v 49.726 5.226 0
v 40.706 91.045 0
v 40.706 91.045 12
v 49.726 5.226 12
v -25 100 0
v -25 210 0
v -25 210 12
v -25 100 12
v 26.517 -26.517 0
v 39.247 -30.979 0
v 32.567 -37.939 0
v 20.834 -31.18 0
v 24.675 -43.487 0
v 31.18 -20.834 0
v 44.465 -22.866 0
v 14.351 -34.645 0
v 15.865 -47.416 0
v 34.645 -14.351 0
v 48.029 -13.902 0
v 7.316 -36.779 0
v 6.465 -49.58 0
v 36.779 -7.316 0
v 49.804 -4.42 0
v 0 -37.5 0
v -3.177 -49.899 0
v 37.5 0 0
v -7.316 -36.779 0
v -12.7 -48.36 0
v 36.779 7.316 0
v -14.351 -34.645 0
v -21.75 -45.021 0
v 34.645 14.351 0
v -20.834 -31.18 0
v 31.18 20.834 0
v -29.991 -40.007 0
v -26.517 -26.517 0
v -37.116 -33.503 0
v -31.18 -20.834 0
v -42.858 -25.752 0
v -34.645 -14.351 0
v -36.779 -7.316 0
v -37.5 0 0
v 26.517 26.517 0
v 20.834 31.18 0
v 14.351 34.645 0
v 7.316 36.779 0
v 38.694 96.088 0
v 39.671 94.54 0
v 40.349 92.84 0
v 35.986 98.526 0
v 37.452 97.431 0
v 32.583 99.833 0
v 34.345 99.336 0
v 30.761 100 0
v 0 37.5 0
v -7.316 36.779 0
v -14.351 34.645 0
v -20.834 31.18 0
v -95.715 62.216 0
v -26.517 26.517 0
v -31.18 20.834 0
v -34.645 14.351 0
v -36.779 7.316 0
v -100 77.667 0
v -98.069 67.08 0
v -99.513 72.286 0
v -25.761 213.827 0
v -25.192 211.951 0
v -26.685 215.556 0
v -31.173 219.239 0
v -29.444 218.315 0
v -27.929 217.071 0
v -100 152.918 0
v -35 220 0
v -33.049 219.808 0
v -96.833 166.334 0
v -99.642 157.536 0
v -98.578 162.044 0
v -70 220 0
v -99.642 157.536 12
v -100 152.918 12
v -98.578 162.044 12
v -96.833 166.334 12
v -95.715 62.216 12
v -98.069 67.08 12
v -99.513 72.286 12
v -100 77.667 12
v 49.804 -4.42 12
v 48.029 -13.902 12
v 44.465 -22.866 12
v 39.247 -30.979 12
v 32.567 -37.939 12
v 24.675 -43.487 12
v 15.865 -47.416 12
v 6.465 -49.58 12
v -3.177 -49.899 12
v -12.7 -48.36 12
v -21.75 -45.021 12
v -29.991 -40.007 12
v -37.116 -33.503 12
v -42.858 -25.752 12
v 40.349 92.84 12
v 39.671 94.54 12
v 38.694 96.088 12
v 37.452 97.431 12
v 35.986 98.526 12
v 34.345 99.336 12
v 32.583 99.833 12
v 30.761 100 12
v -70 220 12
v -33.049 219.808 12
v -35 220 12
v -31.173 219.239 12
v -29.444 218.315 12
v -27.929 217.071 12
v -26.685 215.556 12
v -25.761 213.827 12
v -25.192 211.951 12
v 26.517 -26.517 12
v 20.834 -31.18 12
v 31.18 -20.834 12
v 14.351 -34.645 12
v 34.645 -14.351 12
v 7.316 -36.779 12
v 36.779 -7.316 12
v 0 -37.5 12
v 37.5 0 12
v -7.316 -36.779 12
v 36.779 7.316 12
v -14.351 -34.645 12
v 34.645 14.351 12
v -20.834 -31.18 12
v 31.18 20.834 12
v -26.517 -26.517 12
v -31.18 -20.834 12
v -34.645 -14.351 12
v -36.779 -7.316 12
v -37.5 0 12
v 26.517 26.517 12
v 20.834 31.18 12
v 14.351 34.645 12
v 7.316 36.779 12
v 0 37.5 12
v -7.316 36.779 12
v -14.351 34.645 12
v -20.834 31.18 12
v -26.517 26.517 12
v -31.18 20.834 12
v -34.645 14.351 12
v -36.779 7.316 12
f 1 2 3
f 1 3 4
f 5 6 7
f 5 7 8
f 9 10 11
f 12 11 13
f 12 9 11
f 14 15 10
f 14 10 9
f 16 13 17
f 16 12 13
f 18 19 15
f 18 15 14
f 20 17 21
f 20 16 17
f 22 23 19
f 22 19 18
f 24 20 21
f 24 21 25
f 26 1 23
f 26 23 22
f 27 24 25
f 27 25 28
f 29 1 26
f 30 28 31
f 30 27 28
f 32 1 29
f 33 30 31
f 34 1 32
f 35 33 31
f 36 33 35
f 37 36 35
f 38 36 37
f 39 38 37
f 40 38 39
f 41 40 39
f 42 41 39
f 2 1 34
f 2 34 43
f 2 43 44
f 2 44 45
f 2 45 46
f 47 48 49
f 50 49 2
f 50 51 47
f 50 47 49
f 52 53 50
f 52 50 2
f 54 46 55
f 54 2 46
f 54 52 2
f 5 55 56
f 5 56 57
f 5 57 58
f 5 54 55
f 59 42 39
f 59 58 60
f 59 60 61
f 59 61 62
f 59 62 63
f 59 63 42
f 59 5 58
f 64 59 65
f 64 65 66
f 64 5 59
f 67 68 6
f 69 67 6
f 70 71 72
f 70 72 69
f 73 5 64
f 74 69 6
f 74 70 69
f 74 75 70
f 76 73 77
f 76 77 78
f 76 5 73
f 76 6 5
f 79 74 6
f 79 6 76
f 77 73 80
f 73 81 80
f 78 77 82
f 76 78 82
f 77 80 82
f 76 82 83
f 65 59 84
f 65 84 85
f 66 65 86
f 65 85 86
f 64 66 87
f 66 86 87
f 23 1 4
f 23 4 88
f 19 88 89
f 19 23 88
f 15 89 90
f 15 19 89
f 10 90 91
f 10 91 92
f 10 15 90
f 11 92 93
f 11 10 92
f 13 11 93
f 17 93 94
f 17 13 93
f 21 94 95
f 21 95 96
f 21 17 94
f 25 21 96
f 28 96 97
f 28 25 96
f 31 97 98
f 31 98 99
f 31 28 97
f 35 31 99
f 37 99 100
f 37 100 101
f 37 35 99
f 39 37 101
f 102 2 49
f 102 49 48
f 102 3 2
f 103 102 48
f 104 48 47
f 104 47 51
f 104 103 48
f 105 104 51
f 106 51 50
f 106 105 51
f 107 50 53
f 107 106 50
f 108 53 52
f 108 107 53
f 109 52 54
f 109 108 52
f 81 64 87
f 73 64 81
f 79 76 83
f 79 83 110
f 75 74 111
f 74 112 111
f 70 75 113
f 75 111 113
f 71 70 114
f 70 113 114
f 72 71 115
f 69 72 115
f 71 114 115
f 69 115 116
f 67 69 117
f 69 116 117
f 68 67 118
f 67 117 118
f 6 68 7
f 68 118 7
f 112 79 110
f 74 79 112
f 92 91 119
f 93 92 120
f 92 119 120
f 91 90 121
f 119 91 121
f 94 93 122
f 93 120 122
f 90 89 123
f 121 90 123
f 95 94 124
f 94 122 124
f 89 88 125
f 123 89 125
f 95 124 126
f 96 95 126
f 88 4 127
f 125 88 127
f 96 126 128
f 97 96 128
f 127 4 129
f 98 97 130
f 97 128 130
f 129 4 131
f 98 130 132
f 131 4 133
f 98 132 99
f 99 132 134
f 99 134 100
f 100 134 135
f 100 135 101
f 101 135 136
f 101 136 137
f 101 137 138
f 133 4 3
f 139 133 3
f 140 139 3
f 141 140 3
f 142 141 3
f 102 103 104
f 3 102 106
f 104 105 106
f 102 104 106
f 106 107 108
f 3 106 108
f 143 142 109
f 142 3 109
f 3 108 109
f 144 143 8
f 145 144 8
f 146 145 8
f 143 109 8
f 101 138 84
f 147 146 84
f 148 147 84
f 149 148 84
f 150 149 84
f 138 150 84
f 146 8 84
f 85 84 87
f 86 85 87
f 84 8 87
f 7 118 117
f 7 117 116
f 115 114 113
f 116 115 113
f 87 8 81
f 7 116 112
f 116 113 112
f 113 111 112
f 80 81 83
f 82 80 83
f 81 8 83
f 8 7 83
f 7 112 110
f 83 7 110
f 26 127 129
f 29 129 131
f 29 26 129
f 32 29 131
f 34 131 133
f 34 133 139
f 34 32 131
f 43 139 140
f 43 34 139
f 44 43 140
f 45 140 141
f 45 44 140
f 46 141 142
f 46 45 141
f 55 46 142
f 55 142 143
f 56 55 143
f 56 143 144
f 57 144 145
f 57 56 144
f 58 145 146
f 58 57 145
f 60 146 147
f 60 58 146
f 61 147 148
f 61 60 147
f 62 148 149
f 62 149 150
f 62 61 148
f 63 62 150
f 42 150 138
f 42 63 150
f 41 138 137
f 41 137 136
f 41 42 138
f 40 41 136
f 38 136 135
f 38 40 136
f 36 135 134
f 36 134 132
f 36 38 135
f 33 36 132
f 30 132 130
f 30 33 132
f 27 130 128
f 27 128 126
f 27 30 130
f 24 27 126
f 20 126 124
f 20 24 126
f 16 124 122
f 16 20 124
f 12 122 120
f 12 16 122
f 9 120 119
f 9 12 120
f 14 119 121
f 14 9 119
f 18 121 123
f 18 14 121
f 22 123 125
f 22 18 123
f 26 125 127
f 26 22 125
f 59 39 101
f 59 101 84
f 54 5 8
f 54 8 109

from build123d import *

# Parameters (mm, degrees)
SKETCH_1_R      = 37.5
EXTRUDE_1_DEPTH = 12
FILLET_1_R      = 10
FILLET_2_R      = 30


with BuildPart() as part:
    # 草图1 → 凸台-拉伸1 (new body)
    with BuildSketch(Plane.XY):
        with BuildLine():
            Line((-42.858365035, -25.751903746), (-100, 69.347746915))
            Line((-100, 69.347746915), (-100, 160))
            Line((-100, 160), (-70, 220))
            Line((-70, 220), (-25, 220))
            Line((-25, 220), (-25, 100))
            Line((-25, 100), (39.764990452, 100))
            Line((39.764990452, 100), (49.726094768, 5.226423163))
            ThreePointArc((49.726094768, 5.226423163), (15.86523282, -47.41618276), (-42.858365035, -25.751903746))
        make_face()
        Circle(SKETCH_1_R, mode=Mode.SUBTRACT)
    extrude(amount=EXTRUDE_1_DEPTH)

    # 圆角1
    fillet_1_edges = [part.edges().sort_by_distance(p)[0] for p in [
        (-25, 220, 6),
        (39.764990452, 100, 6),
    ]]
    fillet(fillet_1_edges, radius=FILLET_1_R)

    # 圆角2
    fillet_2_edges = [part.edges().sort_by_distance(p)[0] for p in [
        (-100, 69.347746915, 6),
        (-100, 160, 6),
    ]]
    fillet(fillet_2_edges, radius=FILLET_2_R)


solid = part.part
